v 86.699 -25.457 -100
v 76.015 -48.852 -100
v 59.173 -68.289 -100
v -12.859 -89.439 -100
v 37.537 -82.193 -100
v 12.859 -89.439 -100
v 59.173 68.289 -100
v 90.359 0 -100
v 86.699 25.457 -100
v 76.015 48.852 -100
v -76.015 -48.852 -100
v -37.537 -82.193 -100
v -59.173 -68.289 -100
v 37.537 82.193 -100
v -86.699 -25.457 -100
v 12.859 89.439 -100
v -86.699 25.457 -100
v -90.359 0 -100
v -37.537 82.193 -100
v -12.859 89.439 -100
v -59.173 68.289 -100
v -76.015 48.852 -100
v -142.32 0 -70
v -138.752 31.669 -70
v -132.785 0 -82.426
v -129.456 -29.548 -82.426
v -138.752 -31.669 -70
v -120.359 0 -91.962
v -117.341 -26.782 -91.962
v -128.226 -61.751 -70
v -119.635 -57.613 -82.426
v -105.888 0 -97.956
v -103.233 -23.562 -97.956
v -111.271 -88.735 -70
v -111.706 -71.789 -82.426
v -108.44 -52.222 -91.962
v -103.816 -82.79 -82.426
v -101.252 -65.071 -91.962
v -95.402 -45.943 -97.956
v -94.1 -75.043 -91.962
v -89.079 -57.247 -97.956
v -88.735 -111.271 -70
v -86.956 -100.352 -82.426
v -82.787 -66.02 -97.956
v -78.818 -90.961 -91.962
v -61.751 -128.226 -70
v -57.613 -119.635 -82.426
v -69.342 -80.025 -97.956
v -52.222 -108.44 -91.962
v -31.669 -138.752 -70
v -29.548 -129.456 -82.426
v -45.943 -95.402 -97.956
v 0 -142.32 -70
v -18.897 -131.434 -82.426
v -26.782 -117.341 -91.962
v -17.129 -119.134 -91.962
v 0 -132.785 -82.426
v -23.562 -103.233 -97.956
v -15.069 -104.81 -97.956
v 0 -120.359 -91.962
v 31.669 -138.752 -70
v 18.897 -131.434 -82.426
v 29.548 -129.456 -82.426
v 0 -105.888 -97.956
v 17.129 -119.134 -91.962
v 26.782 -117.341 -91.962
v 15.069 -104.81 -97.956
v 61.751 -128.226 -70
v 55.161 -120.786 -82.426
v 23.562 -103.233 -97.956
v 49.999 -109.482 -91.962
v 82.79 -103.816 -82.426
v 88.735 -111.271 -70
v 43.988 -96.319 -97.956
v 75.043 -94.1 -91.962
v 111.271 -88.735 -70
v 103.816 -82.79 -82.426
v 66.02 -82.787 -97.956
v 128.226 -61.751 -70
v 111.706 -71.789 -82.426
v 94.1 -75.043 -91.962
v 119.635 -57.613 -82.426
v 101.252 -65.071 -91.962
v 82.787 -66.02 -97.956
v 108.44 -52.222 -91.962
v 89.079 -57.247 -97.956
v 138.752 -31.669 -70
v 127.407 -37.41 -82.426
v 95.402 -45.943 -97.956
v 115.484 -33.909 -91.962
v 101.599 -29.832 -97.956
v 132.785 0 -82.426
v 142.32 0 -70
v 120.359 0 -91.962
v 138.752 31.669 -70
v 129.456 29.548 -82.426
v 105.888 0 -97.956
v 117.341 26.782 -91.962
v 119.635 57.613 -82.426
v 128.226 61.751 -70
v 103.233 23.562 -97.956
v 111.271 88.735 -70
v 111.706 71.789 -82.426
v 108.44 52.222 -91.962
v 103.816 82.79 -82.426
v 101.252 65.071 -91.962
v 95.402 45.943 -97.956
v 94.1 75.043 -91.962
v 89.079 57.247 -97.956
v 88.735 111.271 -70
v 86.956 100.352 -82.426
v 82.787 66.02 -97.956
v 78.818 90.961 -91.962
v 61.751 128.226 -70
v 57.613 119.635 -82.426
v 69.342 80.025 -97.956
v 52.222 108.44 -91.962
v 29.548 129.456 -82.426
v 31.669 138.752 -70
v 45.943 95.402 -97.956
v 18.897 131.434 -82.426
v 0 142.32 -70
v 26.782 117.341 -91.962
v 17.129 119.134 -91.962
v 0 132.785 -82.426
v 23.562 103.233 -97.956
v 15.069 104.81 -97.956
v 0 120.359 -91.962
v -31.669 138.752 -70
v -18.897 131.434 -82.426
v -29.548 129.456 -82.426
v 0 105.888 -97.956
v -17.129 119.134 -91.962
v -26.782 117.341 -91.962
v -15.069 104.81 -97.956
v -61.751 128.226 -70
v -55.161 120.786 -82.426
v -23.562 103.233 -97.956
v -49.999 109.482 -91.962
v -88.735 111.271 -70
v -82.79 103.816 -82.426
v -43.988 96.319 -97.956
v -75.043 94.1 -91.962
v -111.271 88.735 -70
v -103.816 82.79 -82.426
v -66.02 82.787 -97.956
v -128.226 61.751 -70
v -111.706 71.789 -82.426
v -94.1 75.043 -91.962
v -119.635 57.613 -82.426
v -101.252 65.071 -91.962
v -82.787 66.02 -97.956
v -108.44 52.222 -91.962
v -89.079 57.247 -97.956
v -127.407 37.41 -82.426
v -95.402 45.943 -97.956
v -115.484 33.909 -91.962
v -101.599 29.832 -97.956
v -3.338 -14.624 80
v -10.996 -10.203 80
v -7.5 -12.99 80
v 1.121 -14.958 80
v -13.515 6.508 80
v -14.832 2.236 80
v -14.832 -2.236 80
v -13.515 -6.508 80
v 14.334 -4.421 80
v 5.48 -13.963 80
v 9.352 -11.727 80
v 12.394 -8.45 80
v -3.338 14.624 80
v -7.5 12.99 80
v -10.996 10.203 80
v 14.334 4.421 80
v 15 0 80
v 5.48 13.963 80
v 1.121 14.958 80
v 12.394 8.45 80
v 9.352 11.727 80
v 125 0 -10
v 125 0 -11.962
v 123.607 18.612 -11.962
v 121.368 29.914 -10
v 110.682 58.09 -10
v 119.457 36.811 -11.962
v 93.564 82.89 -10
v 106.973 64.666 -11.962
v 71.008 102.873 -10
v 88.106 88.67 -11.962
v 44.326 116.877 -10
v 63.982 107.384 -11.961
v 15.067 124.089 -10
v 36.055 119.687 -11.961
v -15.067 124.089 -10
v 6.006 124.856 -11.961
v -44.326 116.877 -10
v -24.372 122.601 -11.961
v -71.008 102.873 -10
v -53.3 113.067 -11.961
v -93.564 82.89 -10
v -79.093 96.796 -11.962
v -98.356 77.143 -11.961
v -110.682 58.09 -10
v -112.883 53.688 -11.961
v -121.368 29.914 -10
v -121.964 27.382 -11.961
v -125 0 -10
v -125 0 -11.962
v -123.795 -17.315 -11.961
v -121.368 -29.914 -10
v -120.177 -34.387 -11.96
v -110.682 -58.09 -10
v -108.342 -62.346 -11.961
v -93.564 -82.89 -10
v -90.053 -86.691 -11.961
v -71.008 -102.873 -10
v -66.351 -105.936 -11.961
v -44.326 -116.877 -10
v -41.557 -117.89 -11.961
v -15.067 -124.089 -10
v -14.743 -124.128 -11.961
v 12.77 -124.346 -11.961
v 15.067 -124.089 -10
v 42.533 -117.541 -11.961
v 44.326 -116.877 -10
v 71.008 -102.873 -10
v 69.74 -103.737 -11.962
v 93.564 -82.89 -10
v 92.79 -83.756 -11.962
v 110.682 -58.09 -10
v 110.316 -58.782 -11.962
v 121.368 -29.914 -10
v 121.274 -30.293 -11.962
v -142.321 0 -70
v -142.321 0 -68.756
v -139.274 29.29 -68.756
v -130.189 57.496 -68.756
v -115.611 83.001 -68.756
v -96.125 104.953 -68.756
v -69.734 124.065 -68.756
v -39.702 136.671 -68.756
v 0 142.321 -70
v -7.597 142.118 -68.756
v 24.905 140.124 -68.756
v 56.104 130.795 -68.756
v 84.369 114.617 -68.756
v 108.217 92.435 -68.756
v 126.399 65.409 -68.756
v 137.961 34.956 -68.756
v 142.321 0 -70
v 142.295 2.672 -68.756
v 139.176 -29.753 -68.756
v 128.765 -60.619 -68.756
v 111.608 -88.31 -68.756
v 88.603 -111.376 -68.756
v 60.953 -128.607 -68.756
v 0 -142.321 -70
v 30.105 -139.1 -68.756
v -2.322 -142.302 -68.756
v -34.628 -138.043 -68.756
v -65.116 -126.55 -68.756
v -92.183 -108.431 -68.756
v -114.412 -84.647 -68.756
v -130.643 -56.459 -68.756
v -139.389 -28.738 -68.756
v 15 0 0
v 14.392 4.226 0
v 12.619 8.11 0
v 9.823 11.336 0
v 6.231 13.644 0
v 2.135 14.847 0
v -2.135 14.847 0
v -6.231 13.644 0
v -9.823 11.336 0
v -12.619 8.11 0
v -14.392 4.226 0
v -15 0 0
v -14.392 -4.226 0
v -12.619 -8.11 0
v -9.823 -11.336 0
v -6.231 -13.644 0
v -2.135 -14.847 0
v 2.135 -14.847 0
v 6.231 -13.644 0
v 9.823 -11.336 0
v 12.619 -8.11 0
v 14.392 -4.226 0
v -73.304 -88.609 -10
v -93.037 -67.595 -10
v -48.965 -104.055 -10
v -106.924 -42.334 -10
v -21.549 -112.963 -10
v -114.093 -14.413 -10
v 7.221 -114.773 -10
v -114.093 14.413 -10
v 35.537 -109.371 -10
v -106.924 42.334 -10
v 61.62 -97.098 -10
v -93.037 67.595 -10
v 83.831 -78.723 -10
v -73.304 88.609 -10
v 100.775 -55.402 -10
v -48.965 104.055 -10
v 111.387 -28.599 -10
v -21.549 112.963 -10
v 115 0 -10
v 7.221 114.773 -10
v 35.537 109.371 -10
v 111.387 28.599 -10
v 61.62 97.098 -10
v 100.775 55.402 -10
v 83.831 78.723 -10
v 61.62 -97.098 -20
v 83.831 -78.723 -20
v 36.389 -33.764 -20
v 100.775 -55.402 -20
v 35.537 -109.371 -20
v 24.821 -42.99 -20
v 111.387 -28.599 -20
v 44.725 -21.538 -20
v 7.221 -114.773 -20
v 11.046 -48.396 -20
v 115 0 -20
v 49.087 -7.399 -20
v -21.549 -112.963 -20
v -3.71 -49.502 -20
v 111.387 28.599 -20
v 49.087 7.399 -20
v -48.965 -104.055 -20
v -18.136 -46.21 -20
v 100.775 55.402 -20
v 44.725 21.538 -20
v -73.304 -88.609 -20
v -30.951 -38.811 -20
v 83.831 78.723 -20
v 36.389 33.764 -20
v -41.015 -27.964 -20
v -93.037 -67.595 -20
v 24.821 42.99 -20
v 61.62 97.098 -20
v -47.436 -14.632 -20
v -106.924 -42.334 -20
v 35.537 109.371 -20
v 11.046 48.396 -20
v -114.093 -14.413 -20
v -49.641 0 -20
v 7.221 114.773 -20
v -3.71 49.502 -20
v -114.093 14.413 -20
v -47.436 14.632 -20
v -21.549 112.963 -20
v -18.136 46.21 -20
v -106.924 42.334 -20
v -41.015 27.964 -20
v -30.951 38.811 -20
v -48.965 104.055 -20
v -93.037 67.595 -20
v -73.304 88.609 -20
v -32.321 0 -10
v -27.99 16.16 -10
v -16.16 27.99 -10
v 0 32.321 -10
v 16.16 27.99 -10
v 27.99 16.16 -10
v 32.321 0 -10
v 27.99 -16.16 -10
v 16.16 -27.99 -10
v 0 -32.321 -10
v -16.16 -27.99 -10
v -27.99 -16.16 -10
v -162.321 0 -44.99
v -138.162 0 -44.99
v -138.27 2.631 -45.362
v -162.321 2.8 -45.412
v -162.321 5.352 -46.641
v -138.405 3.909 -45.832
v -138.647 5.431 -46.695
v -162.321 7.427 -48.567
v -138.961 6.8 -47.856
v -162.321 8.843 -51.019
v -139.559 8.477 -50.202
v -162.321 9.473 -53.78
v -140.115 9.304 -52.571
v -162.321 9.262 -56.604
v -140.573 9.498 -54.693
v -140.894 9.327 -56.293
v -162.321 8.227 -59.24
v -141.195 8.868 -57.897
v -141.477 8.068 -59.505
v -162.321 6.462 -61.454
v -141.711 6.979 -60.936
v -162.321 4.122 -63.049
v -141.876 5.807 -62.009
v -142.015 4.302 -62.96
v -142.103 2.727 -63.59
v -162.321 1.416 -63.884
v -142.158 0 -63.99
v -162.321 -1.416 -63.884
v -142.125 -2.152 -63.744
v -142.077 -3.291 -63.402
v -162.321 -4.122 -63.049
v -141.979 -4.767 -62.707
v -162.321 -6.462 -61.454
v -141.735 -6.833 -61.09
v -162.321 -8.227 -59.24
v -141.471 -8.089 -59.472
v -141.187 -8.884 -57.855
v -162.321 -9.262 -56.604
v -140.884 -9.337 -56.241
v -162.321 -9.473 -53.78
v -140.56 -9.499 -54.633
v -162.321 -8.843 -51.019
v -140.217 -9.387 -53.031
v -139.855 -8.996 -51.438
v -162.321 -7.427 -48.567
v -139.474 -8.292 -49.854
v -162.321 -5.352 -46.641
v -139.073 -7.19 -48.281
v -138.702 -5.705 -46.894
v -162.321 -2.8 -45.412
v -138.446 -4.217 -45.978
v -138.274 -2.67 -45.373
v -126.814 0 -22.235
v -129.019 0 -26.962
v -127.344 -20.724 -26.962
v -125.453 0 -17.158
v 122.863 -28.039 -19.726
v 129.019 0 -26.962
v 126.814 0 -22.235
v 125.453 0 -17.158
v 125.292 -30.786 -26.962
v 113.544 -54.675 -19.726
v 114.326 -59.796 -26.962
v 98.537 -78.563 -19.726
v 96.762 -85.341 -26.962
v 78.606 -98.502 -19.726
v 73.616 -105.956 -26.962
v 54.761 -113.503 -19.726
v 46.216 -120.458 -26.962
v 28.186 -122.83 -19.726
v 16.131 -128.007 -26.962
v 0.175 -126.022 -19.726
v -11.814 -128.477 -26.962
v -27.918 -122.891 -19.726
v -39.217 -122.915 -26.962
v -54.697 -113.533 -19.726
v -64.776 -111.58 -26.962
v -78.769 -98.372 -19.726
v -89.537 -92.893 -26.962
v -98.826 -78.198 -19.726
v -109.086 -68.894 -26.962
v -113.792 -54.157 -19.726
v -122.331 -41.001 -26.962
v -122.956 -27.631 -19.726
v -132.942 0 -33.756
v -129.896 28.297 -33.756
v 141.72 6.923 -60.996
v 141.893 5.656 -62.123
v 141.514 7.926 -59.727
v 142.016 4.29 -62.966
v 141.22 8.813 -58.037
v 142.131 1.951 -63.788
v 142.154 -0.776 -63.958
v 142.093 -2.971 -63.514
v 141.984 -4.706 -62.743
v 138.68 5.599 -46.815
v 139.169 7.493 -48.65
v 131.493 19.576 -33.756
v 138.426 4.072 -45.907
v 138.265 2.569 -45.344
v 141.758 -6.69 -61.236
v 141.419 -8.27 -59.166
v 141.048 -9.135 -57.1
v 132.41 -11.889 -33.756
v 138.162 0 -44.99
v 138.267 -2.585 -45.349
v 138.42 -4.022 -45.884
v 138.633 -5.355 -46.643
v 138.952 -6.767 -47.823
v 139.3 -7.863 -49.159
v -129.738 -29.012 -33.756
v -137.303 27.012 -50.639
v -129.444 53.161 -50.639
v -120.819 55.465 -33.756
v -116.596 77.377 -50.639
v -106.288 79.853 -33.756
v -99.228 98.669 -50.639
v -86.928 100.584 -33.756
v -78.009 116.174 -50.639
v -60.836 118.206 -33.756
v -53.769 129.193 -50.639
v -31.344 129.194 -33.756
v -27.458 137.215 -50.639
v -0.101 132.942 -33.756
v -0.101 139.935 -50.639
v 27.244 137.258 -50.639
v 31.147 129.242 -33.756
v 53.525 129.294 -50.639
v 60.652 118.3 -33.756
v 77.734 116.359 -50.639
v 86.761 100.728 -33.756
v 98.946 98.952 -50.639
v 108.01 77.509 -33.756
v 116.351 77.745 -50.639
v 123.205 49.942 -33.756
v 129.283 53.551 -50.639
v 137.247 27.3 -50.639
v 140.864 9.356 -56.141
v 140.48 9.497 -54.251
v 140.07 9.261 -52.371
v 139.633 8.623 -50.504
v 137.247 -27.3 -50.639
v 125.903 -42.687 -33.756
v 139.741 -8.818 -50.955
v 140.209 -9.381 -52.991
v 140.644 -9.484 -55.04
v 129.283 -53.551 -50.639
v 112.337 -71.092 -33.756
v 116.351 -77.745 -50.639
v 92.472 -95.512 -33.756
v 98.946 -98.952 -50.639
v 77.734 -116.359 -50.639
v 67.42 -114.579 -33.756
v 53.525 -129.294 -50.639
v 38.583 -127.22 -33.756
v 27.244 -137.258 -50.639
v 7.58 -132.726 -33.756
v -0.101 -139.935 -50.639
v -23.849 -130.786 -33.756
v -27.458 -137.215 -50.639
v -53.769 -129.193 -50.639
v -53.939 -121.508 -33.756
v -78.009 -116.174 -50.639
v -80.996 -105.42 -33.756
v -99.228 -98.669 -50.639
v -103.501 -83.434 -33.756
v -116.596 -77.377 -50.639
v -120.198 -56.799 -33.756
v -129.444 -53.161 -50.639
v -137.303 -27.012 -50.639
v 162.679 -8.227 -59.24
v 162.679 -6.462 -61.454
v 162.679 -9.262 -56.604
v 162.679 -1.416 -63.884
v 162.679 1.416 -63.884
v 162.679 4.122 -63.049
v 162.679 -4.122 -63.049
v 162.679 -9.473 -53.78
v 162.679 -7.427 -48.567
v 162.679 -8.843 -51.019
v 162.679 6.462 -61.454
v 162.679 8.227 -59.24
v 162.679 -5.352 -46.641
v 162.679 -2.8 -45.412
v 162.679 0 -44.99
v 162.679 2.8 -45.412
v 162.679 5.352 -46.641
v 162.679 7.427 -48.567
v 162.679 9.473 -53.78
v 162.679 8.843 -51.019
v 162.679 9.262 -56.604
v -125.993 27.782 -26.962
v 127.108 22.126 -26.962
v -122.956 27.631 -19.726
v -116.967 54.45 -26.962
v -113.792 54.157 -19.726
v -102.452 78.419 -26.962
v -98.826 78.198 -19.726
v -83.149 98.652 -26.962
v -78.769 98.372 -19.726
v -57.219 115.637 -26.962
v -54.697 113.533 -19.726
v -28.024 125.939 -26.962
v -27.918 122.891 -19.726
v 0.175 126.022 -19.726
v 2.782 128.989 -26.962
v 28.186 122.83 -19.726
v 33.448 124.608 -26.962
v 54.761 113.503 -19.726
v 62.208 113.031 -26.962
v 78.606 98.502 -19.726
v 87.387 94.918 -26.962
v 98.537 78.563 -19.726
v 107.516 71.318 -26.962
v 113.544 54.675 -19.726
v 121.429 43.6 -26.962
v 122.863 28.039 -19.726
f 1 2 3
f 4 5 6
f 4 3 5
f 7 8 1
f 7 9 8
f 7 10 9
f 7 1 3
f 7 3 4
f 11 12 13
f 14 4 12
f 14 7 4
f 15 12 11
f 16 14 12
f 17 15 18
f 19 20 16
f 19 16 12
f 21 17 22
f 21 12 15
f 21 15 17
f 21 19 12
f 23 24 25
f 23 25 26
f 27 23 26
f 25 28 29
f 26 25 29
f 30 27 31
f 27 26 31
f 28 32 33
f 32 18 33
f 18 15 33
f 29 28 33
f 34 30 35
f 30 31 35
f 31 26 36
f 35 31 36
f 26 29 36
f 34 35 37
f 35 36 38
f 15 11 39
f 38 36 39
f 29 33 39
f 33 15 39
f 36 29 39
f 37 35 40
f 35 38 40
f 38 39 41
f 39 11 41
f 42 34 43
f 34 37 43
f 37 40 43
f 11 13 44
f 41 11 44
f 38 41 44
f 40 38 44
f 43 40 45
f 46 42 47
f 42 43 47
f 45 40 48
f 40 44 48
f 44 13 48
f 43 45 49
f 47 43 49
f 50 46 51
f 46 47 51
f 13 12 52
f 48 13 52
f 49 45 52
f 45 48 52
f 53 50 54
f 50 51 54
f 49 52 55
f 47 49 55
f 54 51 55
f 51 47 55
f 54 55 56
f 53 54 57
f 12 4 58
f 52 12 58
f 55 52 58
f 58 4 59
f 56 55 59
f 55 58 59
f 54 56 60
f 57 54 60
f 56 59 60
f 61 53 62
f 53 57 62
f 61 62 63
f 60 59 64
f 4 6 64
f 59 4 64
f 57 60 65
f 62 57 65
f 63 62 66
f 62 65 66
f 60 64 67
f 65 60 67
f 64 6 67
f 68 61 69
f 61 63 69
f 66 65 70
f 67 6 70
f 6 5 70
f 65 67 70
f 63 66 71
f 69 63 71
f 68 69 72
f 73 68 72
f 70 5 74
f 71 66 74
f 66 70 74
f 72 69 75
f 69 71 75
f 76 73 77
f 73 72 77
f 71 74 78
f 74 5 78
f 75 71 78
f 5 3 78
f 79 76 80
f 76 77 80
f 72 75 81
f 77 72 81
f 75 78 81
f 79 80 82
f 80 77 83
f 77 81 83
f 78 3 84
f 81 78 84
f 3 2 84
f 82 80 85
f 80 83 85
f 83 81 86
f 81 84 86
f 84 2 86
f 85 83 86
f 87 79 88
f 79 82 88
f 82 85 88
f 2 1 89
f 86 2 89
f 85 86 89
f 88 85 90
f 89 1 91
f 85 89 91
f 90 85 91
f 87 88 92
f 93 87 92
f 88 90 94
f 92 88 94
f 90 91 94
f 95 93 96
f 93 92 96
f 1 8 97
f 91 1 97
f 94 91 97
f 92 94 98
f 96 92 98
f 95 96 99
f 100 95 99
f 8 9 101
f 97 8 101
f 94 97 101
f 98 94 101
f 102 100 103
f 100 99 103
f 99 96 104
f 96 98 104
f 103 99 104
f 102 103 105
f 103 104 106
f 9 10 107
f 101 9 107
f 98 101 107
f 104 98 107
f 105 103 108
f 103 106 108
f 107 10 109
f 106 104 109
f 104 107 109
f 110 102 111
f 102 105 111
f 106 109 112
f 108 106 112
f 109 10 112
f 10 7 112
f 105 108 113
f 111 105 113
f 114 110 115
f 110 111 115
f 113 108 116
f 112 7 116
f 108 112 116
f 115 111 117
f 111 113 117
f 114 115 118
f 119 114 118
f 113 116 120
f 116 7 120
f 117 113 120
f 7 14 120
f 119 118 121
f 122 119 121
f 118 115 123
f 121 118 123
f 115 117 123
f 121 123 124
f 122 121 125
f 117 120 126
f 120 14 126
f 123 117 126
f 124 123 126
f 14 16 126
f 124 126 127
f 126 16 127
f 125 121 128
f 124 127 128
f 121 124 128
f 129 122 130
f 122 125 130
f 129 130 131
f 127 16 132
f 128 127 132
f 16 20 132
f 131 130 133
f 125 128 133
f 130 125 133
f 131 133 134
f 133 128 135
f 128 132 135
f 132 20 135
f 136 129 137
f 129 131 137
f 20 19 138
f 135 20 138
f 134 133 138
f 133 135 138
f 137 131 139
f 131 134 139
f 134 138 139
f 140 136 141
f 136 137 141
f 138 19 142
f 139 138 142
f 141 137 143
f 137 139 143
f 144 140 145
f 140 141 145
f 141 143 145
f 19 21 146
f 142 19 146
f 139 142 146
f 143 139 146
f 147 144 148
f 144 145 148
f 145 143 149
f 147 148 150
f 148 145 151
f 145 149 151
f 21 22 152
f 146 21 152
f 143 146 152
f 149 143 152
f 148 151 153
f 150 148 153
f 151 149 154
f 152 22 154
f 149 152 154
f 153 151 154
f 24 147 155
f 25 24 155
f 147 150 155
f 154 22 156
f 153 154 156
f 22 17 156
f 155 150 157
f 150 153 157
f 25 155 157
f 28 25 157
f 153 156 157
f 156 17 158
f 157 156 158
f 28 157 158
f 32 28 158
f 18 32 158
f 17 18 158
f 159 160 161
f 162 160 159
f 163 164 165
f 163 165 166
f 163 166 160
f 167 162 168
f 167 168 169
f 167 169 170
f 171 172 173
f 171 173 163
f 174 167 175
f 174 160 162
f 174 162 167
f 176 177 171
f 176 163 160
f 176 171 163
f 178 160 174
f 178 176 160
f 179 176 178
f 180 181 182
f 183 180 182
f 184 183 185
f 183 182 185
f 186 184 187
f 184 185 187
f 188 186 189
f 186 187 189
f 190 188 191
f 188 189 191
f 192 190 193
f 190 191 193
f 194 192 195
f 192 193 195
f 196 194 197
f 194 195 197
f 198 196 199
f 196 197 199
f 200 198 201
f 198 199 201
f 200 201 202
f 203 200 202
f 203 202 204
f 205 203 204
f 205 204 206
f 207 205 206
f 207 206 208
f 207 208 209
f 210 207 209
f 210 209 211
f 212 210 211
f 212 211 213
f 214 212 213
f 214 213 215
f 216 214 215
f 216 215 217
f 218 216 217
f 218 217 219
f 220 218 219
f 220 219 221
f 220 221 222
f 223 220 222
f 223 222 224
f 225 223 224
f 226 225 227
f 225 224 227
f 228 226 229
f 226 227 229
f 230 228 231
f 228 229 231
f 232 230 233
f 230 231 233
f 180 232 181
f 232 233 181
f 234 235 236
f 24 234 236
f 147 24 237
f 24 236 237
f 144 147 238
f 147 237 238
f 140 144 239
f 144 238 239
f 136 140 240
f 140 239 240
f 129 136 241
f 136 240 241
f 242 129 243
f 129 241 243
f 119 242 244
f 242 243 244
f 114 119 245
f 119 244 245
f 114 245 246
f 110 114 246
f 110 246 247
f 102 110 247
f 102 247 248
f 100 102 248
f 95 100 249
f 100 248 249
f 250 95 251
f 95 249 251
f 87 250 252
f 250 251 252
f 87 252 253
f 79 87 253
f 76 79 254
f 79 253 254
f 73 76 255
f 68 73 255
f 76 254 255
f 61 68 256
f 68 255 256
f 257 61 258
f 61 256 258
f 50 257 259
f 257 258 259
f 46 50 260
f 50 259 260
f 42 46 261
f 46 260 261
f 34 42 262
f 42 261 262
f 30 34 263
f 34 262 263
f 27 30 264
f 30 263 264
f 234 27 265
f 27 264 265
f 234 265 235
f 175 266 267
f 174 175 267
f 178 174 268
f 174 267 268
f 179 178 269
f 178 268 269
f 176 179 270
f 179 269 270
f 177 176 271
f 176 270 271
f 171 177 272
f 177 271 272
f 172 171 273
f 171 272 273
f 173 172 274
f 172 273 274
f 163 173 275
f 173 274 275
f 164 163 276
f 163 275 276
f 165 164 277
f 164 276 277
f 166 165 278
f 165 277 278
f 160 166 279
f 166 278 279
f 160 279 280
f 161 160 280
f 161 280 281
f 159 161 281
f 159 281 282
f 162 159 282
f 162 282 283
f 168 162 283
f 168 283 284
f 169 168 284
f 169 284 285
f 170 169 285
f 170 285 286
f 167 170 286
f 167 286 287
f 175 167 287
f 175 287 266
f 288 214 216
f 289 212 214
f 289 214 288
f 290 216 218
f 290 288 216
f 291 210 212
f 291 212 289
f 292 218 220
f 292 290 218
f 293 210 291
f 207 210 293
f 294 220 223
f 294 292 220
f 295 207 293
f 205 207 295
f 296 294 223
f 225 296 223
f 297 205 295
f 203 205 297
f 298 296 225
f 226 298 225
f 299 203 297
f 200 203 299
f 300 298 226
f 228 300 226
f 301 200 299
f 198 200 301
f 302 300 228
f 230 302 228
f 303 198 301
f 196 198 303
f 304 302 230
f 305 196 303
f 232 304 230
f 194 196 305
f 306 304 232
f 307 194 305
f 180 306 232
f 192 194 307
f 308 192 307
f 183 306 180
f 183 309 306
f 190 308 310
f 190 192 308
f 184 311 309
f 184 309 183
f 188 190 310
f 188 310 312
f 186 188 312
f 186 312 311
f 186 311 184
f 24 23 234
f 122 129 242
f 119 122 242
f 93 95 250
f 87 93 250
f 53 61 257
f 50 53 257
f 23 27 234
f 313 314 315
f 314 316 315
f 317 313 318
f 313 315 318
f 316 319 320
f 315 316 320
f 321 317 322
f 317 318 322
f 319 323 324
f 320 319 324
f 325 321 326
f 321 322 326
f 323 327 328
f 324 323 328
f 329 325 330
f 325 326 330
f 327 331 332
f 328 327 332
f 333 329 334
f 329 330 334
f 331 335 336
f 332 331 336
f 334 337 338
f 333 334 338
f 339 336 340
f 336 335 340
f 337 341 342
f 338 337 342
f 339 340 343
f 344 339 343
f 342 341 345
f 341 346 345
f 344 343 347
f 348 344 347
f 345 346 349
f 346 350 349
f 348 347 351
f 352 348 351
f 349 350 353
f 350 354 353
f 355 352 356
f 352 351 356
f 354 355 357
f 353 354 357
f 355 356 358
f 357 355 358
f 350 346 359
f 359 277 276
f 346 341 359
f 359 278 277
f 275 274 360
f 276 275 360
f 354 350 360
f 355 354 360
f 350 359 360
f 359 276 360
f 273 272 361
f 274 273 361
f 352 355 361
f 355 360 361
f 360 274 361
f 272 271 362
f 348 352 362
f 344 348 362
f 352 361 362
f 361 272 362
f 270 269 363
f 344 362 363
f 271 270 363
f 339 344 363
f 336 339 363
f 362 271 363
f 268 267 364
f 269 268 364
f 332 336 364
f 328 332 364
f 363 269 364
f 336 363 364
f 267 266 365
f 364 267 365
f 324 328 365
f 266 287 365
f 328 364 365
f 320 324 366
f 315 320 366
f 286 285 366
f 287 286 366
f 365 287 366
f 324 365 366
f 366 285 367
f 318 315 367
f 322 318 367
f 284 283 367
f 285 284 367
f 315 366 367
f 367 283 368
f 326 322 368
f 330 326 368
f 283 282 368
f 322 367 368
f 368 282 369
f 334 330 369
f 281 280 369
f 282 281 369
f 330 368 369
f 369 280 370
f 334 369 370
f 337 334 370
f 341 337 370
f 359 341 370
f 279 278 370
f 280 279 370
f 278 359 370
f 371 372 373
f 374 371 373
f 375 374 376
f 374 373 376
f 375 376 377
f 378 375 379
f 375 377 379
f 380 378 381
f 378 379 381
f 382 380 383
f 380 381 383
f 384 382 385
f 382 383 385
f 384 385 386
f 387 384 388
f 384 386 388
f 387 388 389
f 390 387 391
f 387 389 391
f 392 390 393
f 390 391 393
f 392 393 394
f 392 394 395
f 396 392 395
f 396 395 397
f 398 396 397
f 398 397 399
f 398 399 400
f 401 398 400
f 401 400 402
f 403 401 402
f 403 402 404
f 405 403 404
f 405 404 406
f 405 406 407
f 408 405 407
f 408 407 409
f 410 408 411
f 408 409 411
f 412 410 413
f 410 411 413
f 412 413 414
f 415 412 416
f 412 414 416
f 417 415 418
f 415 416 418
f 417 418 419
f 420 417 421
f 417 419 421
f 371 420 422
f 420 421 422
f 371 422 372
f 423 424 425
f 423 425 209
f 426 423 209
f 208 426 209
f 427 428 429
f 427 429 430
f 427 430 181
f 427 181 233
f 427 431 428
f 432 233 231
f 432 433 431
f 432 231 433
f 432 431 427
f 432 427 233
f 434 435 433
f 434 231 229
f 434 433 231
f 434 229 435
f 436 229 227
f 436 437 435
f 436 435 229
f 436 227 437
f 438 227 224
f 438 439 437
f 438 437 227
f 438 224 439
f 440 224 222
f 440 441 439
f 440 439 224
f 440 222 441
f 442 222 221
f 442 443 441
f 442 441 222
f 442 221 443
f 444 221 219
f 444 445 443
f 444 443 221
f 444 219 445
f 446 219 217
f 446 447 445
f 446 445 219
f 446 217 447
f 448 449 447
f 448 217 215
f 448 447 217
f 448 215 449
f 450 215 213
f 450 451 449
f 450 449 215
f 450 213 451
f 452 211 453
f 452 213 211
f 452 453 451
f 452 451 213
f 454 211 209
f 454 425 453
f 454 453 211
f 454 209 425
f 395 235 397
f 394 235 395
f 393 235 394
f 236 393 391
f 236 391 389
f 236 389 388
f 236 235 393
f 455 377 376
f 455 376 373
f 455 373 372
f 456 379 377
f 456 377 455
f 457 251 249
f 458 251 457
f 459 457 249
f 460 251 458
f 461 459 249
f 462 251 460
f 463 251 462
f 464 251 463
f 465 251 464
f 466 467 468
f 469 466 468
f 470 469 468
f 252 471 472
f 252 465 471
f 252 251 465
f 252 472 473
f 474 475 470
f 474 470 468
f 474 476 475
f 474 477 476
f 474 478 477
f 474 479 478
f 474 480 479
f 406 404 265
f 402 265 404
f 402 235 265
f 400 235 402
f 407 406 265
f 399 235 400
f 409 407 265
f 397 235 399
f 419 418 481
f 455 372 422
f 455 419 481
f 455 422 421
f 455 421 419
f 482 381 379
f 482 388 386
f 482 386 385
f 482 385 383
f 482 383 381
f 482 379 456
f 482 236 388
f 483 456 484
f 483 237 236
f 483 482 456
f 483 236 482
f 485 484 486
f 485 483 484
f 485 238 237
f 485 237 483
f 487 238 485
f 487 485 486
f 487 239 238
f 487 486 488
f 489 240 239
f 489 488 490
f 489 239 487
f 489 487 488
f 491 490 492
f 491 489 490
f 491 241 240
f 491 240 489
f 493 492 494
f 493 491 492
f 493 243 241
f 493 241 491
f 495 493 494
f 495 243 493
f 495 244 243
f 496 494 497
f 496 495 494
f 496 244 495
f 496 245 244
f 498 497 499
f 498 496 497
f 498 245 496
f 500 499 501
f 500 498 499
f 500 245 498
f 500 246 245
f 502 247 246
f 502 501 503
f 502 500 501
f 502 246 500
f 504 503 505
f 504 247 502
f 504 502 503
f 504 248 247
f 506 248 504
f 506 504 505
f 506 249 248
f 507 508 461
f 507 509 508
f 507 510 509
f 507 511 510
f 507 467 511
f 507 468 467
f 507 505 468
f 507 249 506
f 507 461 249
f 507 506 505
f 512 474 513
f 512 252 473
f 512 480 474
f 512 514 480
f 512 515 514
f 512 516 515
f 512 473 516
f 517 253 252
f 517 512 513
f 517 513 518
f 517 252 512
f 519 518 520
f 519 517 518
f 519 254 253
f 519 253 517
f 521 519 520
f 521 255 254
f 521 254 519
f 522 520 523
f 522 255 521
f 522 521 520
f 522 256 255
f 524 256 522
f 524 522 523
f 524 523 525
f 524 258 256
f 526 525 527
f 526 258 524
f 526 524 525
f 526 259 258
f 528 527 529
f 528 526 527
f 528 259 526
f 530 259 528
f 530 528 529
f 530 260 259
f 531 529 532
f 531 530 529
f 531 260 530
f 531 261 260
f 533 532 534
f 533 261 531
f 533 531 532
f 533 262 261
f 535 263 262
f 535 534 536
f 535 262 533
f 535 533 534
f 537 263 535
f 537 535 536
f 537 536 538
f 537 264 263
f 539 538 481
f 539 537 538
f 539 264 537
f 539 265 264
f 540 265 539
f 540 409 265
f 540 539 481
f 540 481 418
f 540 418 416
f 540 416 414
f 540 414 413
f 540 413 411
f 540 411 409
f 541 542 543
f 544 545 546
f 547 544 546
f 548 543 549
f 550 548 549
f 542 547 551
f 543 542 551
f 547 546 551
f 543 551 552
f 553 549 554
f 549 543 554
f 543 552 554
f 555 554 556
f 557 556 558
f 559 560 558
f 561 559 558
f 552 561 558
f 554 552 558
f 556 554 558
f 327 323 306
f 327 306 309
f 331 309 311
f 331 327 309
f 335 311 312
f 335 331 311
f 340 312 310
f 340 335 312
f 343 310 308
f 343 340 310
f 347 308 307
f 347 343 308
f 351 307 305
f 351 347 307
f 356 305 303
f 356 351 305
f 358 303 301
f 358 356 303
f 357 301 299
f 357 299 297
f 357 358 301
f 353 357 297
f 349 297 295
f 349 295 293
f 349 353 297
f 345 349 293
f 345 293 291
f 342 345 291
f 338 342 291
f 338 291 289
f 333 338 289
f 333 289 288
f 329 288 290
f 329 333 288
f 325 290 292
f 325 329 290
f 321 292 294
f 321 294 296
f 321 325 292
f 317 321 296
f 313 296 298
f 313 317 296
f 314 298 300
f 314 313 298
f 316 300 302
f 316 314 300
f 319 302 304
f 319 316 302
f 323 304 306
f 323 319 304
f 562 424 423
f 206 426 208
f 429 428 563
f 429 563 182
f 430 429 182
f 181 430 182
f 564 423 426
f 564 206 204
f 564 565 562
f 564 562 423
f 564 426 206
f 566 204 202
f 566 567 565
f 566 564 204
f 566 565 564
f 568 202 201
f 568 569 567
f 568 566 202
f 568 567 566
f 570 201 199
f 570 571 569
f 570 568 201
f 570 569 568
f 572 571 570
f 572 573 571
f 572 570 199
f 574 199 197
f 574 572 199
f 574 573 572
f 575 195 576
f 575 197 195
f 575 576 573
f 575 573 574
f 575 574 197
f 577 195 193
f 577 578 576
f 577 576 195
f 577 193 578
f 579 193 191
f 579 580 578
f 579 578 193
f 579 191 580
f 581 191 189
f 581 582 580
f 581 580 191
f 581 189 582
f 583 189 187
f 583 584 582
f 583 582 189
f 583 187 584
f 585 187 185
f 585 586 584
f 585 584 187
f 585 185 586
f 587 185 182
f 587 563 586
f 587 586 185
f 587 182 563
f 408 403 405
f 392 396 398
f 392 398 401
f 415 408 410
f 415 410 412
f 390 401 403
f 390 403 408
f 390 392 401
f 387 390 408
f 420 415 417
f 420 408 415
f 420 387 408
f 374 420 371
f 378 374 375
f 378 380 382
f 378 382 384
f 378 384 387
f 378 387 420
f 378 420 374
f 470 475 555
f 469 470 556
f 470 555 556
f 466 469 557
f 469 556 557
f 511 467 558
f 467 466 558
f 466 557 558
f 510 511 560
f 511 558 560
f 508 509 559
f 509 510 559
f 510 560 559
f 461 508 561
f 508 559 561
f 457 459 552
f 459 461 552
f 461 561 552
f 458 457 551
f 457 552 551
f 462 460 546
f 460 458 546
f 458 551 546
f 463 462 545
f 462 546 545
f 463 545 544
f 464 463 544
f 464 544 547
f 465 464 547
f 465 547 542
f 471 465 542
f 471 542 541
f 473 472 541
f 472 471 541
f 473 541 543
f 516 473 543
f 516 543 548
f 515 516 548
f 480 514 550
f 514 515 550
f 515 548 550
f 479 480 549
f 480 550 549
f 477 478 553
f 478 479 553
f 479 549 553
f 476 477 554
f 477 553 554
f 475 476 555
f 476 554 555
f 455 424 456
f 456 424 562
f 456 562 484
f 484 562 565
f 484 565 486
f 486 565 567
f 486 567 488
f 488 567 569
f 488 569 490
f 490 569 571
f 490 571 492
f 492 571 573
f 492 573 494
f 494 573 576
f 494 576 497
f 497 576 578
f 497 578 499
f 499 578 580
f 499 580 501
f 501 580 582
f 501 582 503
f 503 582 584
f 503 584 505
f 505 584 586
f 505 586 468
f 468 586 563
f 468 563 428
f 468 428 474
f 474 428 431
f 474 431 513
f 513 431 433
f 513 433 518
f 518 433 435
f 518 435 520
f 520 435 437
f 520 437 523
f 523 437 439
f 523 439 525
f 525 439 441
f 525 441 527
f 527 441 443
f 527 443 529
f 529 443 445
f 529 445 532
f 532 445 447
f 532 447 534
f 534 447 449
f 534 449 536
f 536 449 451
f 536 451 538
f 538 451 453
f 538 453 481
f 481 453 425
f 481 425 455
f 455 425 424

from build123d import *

# Parameters (mm, degrees)
SKETCH1_R                = 15
BOSS_EXTRUDE1_DEPTH      = 80
SKETCH2_R                = 15
BOSS_EXTRUDE2_DEPTH      = 20
BOSS_EXTRUDE2_DRAFT      = -60
SKETCH3_R                = 125
BOSS_EXTRUDE5_DEPTH      = 30
BOSS_EXTRUDE5_DRAFT      = -30
SKETCH6_R                = 125
SKETCH6_R_2              = 115
BOSS_EXTRUDE6_DEPTH      = 10
SKETCH7_R                = 142.320508076
BOSS_EXTRUDE7_DEPTH      = 20
SKETCH9_R                = 142.320508076
BOSS_EXTRUDE8_DEPTH      = 30
BOSS_EXTRUDE8_TAPER      = 30
FILLET1_R                = 60
FILLET3_R                = 70
FILLET4_R                = 30
BOSS_EXTRUDE9_DEPTH      = 20
BOSS_EXTRUDE9_DEPTH_BACK = 305
SKETCH10_R               = 9.5


with BuildPart() as part:
    # Sketch1 → Boss-Extrude1 (new body)
    with BuildSketch(Plane.XY):
        Circle(SKETCH1_R)
    extrude(amount=BOSS_EXTRUDE1_DEPTH)


with BuildPart() as boss_extrude2_tool:
    # Sketch2 → Boss-Extrude2 (with draft: the straight prism first)
    with BuildSketch(Plane(origin=(0, 0, 0), x_dir=(-1, 0, 0), z_dir=(0, 0, -1))):
        Circle(SKETCH2_R)
    extrude(amount=BOSS_EXTRUDE2_DEPTH)
    # Boss-Extrude2: the draft: its side faces are tilted about the plane it starts from
    boss_extrude2_sides = [boss_extrude2_tool.faces().sort_by_distance(p)[0] for p in [
        (15, 0, -10),
    ]]
    draft(boss_extrude2_sides, Plane(origin=(0, 0, 0), x_dir=(-1, 0, 0), z_dir=(0, 0, -1)), BOSS_EXTRUDE2_DRAFT)


with BuildPart() as part_1:
    add(part.part)

    # Boss-Extrude2: add boss_extrude2_tool
    add(boss_extrude2_tool.part)


with BuildPart() as boss_extrude5_tool:
    # Sketch3 → Boss-Extrude5 (with draft: the straight prism first)
    with BuildSketch(Plane(origin=(0, 0, -20), x_dir=(-1, 0, 0), z_dir=(0, 0, -1))):
        Circle(SKETCH3_R)
    extrude(amount=BOSS_EXTRUDE5_DEPTH)
    # Boss-Extrude5: the draft: its side faces are tilted about the plane it starts from
    boss_extrude5_sides = [boss_extrude5_tool.faces().sort_by_distance(p)[0] for p in [
        (125, 0, -35),
    ]]
    draft(boss_extrude5_sides, Plane(origin=(0, 0, -20), x_dir=(-1, 0, 0), z_dir=(0, 0, -1)), BOSS_EXTRUDE5_DRAFT)


with BuildPart() as part_2:
    add(part_1.part)

    # Boss-Extrude5: add boss_extrude5_tool
    add(boss_extrude5_tool.part)

    # Sketch6 → Boss-Extrude6 (add)
    with BuildSketch(Plane.XY.offset(-20)):
        Circle(SKETCH6_R)
        Circle(SKETCH6_R_2, mode=Mode.SUBTRACT)
    extrude(amount=BOSS_EXTRUDE6_DEPTH)

    # Sketch7 → Boss-Extrude7 (add)
    with BuildSketch(Plane(origin=(0, 0, -50), x_dir=(-1, 0, 0), z_dir=(0, 0, -1))):
        Circle(SKETCH7_R)
    extrude(amount=BOSS_EXTRUDE7_DEPTH)

    # Sketch9 → Boss-Extrude8 (add)
    with BuildSketch(Plane(origin=(0, 0, -70), x_dir=(-1, 0, 0), z_dir=(0, 0, -1))):
        Circle(SKETCH9_R)
    extrude(amount=BOSS_EXTRUDE8_DEPTH, taper=BOSS_EXTRUDE8_TAPER)

    # Fillet1
    fillet1_edges = [part_2.edges().sort_by_distance(p)[0] for p in [
        (125, 0, -100),
    ]]
    fillet(fillet1_edges, radius=FILLET1_R - 0.0001)  # a hair under: the kernel refuses the full size

    # Fillet3
    fillet3_edges = [part_2.edges().sort_by_distance(p)[0] for p in [
        (142.320508076, 0, -50),
    ]]
    fillet(fillet3_edges, radius=FILLET3_R)

    # Fillet4
    fillet4_edges = [part_2.edges().sort_by_distance(p)[0] for p in [
        (0, -125, -20),
    ]]
    fillet(fillet4_edges, radius=FILLET4_R)

    # Sketch10 → Boss-Extrude9 (add, two sides: drawn at the far end of the back side and taken through both)
    with BuildSketch(Plane.ZY.offset(142.320508076).offset(-BOSS_EXTRUDE9_DEPTH_BACK)):
        with Locations((-54.490163429, 0)):
            Circle(SKETCH10_R)
    extrude(amount=BOSS_EXTRUDE9_DEPTH + BOSS_EXTRUDE9_DEPTH_BACK)


solid = part_2.part
